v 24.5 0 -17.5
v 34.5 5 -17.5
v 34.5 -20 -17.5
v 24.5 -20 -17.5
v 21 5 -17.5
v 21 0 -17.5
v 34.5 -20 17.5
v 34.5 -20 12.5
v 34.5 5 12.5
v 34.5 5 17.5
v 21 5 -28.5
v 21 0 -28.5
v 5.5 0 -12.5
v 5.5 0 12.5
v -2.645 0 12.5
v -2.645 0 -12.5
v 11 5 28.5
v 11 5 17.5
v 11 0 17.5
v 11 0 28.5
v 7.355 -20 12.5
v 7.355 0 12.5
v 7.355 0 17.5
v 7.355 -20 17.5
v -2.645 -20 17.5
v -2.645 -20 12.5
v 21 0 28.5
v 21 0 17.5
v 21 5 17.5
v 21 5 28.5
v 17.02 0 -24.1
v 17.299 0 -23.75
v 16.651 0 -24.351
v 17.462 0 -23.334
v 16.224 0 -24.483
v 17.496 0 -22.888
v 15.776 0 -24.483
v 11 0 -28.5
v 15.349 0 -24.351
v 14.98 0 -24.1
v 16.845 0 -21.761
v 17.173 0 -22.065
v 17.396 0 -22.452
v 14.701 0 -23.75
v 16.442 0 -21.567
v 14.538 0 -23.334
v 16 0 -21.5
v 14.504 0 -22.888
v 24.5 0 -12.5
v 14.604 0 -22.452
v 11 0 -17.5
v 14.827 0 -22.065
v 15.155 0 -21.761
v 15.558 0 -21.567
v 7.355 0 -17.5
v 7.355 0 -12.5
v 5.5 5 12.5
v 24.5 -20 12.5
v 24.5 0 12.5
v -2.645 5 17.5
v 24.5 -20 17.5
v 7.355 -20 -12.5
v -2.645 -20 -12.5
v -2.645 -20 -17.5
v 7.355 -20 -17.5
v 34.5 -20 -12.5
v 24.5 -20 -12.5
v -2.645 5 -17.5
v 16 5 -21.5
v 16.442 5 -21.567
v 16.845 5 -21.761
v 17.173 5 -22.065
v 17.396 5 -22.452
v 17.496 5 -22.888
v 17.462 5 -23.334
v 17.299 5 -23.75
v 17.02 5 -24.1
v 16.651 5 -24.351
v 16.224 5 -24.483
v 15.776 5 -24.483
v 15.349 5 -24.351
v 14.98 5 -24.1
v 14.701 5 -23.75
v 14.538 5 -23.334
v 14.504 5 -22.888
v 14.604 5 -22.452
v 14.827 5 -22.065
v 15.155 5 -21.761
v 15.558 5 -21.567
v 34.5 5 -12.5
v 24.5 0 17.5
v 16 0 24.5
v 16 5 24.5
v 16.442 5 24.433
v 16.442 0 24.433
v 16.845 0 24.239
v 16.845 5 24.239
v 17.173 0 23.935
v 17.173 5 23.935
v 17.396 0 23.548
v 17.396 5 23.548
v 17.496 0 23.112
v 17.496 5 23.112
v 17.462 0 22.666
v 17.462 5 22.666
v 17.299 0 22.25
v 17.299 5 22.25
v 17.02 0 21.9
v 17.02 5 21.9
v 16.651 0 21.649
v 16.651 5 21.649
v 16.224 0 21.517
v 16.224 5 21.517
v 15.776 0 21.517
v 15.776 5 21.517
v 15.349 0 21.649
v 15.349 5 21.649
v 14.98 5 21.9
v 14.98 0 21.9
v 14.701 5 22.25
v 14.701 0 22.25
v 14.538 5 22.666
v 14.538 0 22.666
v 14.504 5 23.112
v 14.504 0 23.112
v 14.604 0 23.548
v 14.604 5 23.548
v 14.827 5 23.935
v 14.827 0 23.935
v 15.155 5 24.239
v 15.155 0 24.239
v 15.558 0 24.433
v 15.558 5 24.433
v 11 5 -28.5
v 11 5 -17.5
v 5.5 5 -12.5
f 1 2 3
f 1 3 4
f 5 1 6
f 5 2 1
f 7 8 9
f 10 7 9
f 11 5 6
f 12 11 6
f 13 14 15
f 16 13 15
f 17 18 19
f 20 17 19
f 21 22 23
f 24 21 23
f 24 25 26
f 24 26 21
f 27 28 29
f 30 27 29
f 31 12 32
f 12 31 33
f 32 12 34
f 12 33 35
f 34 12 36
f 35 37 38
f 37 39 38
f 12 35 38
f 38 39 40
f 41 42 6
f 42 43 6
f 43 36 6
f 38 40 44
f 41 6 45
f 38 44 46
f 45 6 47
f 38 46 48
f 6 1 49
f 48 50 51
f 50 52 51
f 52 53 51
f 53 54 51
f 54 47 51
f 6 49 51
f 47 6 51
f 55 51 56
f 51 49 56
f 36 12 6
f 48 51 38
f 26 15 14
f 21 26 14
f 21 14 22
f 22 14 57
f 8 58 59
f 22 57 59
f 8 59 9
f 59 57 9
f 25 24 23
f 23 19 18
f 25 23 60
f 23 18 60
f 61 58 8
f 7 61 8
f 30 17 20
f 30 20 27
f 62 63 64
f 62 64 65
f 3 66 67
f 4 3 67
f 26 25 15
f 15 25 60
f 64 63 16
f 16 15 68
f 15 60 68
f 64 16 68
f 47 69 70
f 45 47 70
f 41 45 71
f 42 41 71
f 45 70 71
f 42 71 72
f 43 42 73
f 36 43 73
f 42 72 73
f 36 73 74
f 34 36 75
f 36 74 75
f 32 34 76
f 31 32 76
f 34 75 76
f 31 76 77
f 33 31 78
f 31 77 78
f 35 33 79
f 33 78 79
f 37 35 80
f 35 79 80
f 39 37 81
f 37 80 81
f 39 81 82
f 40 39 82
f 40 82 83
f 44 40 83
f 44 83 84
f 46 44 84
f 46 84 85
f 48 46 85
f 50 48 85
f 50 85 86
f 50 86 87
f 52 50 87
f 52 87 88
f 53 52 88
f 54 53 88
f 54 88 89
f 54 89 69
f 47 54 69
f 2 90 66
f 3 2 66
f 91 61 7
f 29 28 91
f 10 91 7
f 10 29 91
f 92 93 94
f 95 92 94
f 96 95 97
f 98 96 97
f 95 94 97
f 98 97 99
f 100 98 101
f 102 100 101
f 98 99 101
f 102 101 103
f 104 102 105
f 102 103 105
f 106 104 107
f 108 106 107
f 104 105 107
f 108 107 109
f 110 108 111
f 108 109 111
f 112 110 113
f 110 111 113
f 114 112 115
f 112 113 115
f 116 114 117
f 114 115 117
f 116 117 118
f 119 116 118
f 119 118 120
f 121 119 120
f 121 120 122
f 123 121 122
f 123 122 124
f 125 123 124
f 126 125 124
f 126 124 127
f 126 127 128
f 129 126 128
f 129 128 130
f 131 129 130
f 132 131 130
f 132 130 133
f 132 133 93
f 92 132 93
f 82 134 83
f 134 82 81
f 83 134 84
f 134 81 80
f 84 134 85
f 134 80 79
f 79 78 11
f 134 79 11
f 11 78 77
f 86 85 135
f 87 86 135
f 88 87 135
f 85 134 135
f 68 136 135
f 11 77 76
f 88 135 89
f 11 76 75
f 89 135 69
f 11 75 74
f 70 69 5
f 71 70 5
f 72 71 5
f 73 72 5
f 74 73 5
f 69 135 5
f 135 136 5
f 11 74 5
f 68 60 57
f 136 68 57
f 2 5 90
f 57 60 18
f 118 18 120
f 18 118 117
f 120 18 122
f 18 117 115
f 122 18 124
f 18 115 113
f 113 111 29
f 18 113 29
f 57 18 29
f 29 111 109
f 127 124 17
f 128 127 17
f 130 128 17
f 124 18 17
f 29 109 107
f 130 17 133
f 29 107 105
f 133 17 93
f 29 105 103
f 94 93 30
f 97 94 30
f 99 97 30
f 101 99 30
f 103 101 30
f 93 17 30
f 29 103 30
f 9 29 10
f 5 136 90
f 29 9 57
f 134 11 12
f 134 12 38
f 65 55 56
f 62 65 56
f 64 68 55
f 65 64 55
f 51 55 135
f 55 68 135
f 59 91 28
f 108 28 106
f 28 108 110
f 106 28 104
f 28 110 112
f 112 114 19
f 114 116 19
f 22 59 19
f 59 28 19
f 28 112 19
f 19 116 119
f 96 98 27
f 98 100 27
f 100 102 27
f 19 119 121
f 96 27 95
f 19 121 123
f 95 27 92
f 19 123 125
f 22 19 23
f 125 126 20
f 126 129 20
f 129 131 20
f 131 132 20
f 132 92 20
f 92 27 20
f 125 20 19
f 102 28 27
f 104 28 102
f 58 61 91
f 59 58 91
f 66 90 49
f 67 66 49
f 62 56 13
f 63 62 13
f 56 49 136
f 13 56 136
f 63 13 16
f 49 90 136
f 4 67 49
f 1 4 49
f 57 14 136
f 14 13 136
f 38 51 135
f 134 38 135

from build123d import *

# Parameters (mm, degrees)
BOSS_EXTRUDE1_DEPTH              = 5
SKETCH3_W                        = 11
SKETCH3_H                        = 5
BOSS_EXTRUDE2_DEPTH              = 5
SKETCH4_W                        = 5
SKETCH4_H                        = 5
BOSS_EXTRUDE3_DEPTH              = 21
SKETCH5_W                        = 10
SKETCH5_H                        = 5
BOSS_EXTRUDE4_DEPTH              = 20
SKETCH6_W                        = 11
SKETCH6_H                        = 5
BOSS_EXTRUDE5_DEPTH              = 5
SKETCH7_W                        = 5
SKETCH7_H                        = 5
BOSS_EXTRUDE6_DEPTH              = 21
SKETCH8_W                        = 10
SKETCH8_H                        = 5
BOSS_EXTRUDE7_DEPTH              = 20
SKETCH11_W                       = 10
SKETCH11_H                       = 5
BOSS_EXTRUDE8_DEPTH              = 3.5
SKETCH12_W                       = 10
SKETCH12_H                       = 5
BOSS_EXTRUDE9_DEPTH              = 3.5
CUT_EXTRUDE6_DEPTH               = 14.5
CUT_EXTRUDE8_DEPTH               = 41.078048855
CUT_EXTRUDE8_DEPTH_BACK          = 14.5
SKETCH17_W                       = 1.38
SKETCH17_H                       = 3.56
CUT_EXTRUDE9_DEPTH               = 14.5
CUT_EXTRUDE10_DEPTH              = 14.5
SKETCH_1_W                       = 8
SKETCH_1_H                       = 25
EXTRUDE_1_DEPTH                  = 5
SKETCH_2_W                       = 8
SKETCH_2_H                       = 25
EXTRUDE_2_DEPTH                  = 5
AUFSATZ_LINEAR_AUSTRAGEN1_DEPTH  = 4
SKIZZE3_W                        = 10
SKIZZE3_H                        = 5
SCHNITT_LINEAR_AUSTRAGEN2_DEPTH  = 3.5
SCHNITT_LINEAR_AUSTRAGEN3_DEPTH  = 4
AUFSATZ_LINEAR_AUSTRAGEN3_DEPTH  = 11
SKIZZE7_R                        = 1.5
SCHNITT_LINEAR_AUSTRAGEN6_DEPTH  = 10
SKIZZE8_W                        = 10
SKIZZE8_H                        = 5
SCHNITT_LINEAR_AUSTRAGEN8_DEPTH  = 4
AUFSATZ_LINEAR_AUSTRAGEN4_DEPTH  = 4
SCHNITT_LINEAR_AUSTRAGEN9_DEPTH  = 4
AUFSATZ_LINEAR_AUSTRAGEN6_DEPTH  = 11
SKIZZE12_R                       = 1.5
SCHNITT_LINEAR_AUSTRAGEN10_DEPTH = 11
SKIZZE15_W                       = 8
SKIZZE15_H                       = 20
SCHNITT_LINEAR_AUSTRAGEN11_DEPTH = 37
AUFSATZ_LINEAR_AUSTRAGEN7_DEPTH  = 20
AUFSATZ_LINEAR_AUSTRAGEN8_DEPTH  = 20
SKIZZE18_W                       = 2.855193512
SKIZZE18_H                       = 5
SCHNITT_LINEAR_AUSTRAGEN12_DEPTH = 35


with BuildPart() as part:
    # Sketch1 → Boss-Extrude1 (new body)
    with BuildSketch(Plane(origin=(0, 0, 0), x_dir=(1, 0, 0), z_dir=(0, 1, 0))):
        Polygon((5.5, 3), (5.5, 0), (5.5, -3), (5.5, -8.5), (0, -8.5), (-5.5, -8.5), (-5.5, -3), (-5.5, 8.5), (0, 8.5), (5.5, 8.5), align=None)
    extrude(amount=BOSS_EXTRUDE1_DEPTH)

    # Sketch3 → Boss-Extrude2 (add)
    with BuildSketch(Plane.XY.offset(8.5)):
        with Locations((0, 2.5)):
            Rectangle(SKETCH3_W, SKETCH3_H)
    extrude(amount=BOSS_EXTRUDE2_DEPTH)

    # Sketch4 → Boss-Extrude3 (add)
    with BuildSketch(Plane(origin=(5.5, 0, 0), x_dir=(0, 0, -1), z_dir=(1, 0, 0))):
        with Locations((-11, 2.5)):
            Rectangle(SKETCH4_W, SKETCH4_H)
    extrude(amount=BOSS_EXTRUDE3_DEPTH)

    # Sketch5 → Boss-Extrude4 (add)
    with BuildSketch(Plane.XZ):
        with Locations((21.5, 11)):
            Rectangle(SKETCH5_W, SKETCH5_H)
    extrude(amount=BOSS_EXTRUDE4_DEPTH)

    # Sketch6 → Boss-Extrude5 (add)
    with BuildSketch(Plane(origin=(0, 0, -8.5), x_dir=(-1, 0, 0), z_dir=(0, 0, -1))):
        with Locations((0, 2.5)):
            Rectangle(SKETCH6_W, SKETCH6_H)
    extrude(amount=BOSS_EXTRUDE5_DEPTH)

    # Sketch7 → Boss-Extrude6 (add)
    with BuildSketch(Plane(origin=(5.5, 0, 0), x_dir=(0, 0, -1), z_dir=(1, 0, 0))):
        with Locations((11, 2.5)):
            Rectangle(SKETCH7_W, SKETCH7_H)
    extrude(amount=BOSS_EXTRUDE6_DEPTH)

    # Sketch8 → Boss-Extrude7 (add)
    with BuildSketch(Plane(origin=(0, 0, 0), x_dir=(-1, 0, 0), z_dir=(0, -1, 0))):
        with Locations((-21.5, 11)):
            Rectangle(SKETCH8_W, SKETCH8_H)
    extrude(amount=BOSS_EXTRUDE7_DEPTH)

    # Sketch11 → Boss-Extrude8 (add)
    with BuildSketch(Plane(origin=(0, 0, 8.5), x_dir=(-1, 0, 0), z_dir=(0, 0, -1))):
        with Locations((-21.5, -12.5)):
            Rectangle(SKETCH11_W, SKETCH11_H)
    extrude(amount=BOSS_EXTRUDE8_DEPTH)

    # Sketch12 → Boss-Extrude9 (add)
    with BuildSketch(Plane.XY.offset(-8.5)):
        with Locations((21.5, -12.5)):
            Rectangle(SKETCH12_W, SKETCH12_H)
    extrude(amount=BOSS_EXTRUDE9_DEPTH)

    # Sketch14 → Cut-Extrude6 (cut)
    with BuildSketch(Plane(origin=(26.5, 0, 0), x_dir=(0, 0, -1), z_dir=(1, 0, 0))):
        Polygon((-6.379568334, -12.879568334), (-6.379568334, -15), (-5, -15), (-5, -11.439784167), (-6.379568334, -11.439784167), align=None)
    extrude(amount=-CUT_EXTRUDE6_DEPTH, mode=Mode.SUBTRACT)

    # Sketch16 → Cut-Extrude8 (cut, two sides: drawn at the far end of the back side and taken through both)
    with BuildSketch(Plane(origin=(26.5, 0, 0), x_dir=(0, 0, -1), z_dir=(1, 0, 0)).offset(-CUT_EXTRUDE8_DEPTH_BACK)):
        Polygon((-6.379568334, -13), (-8.5, -15), (-7.439784167, -15), (-6.379568334, -15), align=None)
    extrude(amount=CUT_EXTRUDE8_DEPTH + CUT_EXTRUDE8_DEPTH_BACK, mode=Mode.SUBTRACT)

    # Sketch17 → Cut-Extrude9 (cut)
    with BuildSketch(Plane(origin=(26.5, 0, 0), x_dir=(0, 0, -1), z_dir=(1, 0, 0))):
        with Locations((5.69, -13.22)):
            Rectangle(SKETCH17_W, SKETCH17_H)
    extrude(amount=-CUT_EXTRUDE9_DEPTH, mode=Mode.SUBTRACT)

    # Sketch18 → Cut-Extrude10 (cut)
    with BuildSketch(Plane(origin=(26.5, 0, 0), x_dir=(0, 0, -1), z_dir=(1, 0, 0))):
        Polygon((6.38, -13), (6.38, -15), (8.5, -15), align=None)
    extrude(amount=-CUT_EXTRUDE10_DEPTH, mode=Mode.SUBTRACT)

    # 草图1 → 凸台-拉伸1 (add)
    with BuildSketch(Plane.XY.offset(13.5)):
        with Locations((30.5, -7.5)):
            Rectangle(SKETCH_1_W, SKETCH_1_H)
    extrude(amount=-EXTRUDE_1_DEPTH)

    # 草图2 → 凸台-拉伸2 (add)
    with BuildSketch(Plane(origin=(0, 0, -13.5), x_dir=(-1, 0, 0), z_dir=(0, 0, -1))):
        with Locations((-30.5, -7.5)):
            Rectangle(SKETCH_2_W, SKETCH_2_H)
    extrude(amount=-EXTRUDE_2_DEPTH)

    # Skizze2 → Aufsatz-Linear austragen1 (add)
    with BuildSketch(Plane.XY.offset(13.5)):
        Polygon((-5.5, 5), (-5.5, 0), (16.5, 0), (16.5, -20), (34.5, -20), (34.5, 5), align=None)
    extrude(amount=AUFSATZ_LINEAR_AUSTRAGEN1_DEPTH)

    # Skizze3 → Schnitt-Linear austragen2 (cut)
    with BuildSketch(Plane(origin=(0, 0, 5), x_dir=(-1, 0, 0), z_dir=(0, 0, -1))):
        with Locations((-21.5, -12.5)):
            Rectangle(SKIZZE3_W, SKIZZE3_H)
    extrude(amount=-SCHNITT_LINEAR_AUSTRAGEN2_DEPTH, mode=Mode.SUBTRACT)

    # Skizze4 → Schnitt-Linear austragen3 (cut)
    with BuildSketch(Plane(origin=(0, 0, 8.5), x_dir=(-1, 0, 0), z_dir=(0, 0, -1))):
        Polygon((-34.5, 5), (-34.5, -20), (-16.5, -20), (-16.5, 0), (-5.5, 0), (-5.5, 5), align=None)
    extrude(amount=-SCHNITT_LINEAR_AUSTRAGEN3_DEPTH, mode=Mode.SUBTRACT)

    # Skizze6 → Aufsatz-Linear austragen3 (add)
    with BuildSketch(Plane.XY.offset(17.5)):
        Polygon((16, 5), (11, 5), (11, 0), (16.5, 0), (21, 0), (21, 5), align=None)
    extrude(amount=AUFSATZ_LINEAR_AUSTRAGEN3_DEPTH)

    # Skizze7 → Schnitt-Linear austragen6 (cut)
    with BuildSketch(Plane(origin=(0, 5, 0), x_dir=(1, 0, 0), z_dir=(0, 1, 0))):
        with Locations(Location((16, -23, 0), (0, 0, 270))):
            Circle(SKIZZE7_R)
    extrude(amount=-SCHNITT_LINEAR_AUSTRAGEN6_DEPTH, mode=Mode.SUBTRACT)

    # Skizze8 → Schnitt-Linear austragen8 (cut)
    with BuildSketch(Plane.XY.offset(-8.5)):
        with Locations((21.5, -12.5)):
            Rectangle(SKIZZE8_W, SKIZZE8_H)
    extrude(amount=SCHNITT_LINEAR_AUSTRAGEN8_DEPTH, mode=Mode.SUBTRACT)

    # Skizze9 → Aufsatz-Linear austragen4 (add)
    with BuildSketch(Plane(origin=(0, 0, -13.5), x_dir=(-1, 0, 0), z_dir=(0, 0, -1))):
        Polygon((-34.5, 5), (-34.5, -20), (-16.5, -20), (-16.5, 0), (5.5, 0), (5.5, 5), align=None)
    extrude(amount=AUFSATZ_LINEAR_AUSTRAGEN4_DEPTH)

    # Skizze10 → Schnitt-Linear austragen9 (cut)
    with BuildSketch(Plane.XY.offset(-8.5)):
        Polygon((5.5, 5), (5.5, 0), (16.5, 0), (16.5, -20), (34.5, -20), (34.5, 5), align=None)
    extrude(amount=-SCHNITT_LINEAR_AUSTRAGEN9_DEPTH, mode=Mode.SUBTRACT)

    # Skizze11 → Aufsatz-Linear austragen6 (add)
    with BuildSketch(Plane(origin=(0, 0, -17.5), x_dir=(-1, 0, 0), z_dir=(0, 0, -1))):
        Polygon((-11, 0), (-11, 5), (-21, 5), (-21, 0), (-16.5, 0), align=None)
    extrude(amount=AUFSATZ_LINEAR_AUSTRAGEN6_DEPTH)

    # Skizze12 → Schnitt-Linear austragen10 (cut)
    with BuildSketch(Plane(origin=(0, 5, 0), x_dir=(1, 0, 0), z_dir=(0, 1, 0))):
        with Locations(Location((16, 23, 0), (0, 0, 270))):
            Circle(SKIZZE12_R)
    extrude(amount=-SCHNITT_LINEAR_AUSTRAGEN10_DEPTH, mode=Mode.SUBTRACT)

    # Skizze15 → Schnitt-Linear austragen11 (cut)
    with BuildSketch(Plane.XY.offset(17.5)):
        with Locations((20.5, -10)):
            Rectangle(SKIZZE15_W, SKIZZE15_H)
    extrude(amount=-SCHNITT_LINEAR_AUSTRAGEN11_DEPTH, mode=Mode.SUBTRACT)

    # Skizze16 → Aufsatz-Linear austragen7 (add)
    with BuildSketch(Plane.XZ):
        Polygon((7.355193512, 12.5), (7.355193512, 17.5), (-2.644806488, 17.5), (-2.644806488, 12.5), (5.5, 12.5), align=None)
    extrude(amount=AUFSATZ_LINEAR_AUSTRAGEN7_DEPTH)

    # Skizze17 → Aufsatz-Linear austragen8 (add)
    with BuildSketch(Plane.XZ):
        Polygon((5.5, -12.5), (-2.644806488, -12.5), (-2.644806488, -17.5), (7.355193512, -17.5), (7.355193512, -12.5), align=None)
    extrude(amount=AUFSATZ_LINEAR_AUSTRAGEN8_DEPTH)

    # Skizze18 → Schnitt-Linear austragen12 (cut)
    with BuildSketch(Plane(origin=(0, 0, -17.5), x_dir=(-1, 0, 0), z_dir=(0, 0, -1))):
        with Locations((4.072403244, 2.5)):
            Rectangle(SKIZZE18_W, SKIZZE18_H)
    extrude(amount=-SCHNITT_LINEAR_AUSTRAGEN12_DEPTH, mode=Mode.SUBTRACT)


solid = part.part
